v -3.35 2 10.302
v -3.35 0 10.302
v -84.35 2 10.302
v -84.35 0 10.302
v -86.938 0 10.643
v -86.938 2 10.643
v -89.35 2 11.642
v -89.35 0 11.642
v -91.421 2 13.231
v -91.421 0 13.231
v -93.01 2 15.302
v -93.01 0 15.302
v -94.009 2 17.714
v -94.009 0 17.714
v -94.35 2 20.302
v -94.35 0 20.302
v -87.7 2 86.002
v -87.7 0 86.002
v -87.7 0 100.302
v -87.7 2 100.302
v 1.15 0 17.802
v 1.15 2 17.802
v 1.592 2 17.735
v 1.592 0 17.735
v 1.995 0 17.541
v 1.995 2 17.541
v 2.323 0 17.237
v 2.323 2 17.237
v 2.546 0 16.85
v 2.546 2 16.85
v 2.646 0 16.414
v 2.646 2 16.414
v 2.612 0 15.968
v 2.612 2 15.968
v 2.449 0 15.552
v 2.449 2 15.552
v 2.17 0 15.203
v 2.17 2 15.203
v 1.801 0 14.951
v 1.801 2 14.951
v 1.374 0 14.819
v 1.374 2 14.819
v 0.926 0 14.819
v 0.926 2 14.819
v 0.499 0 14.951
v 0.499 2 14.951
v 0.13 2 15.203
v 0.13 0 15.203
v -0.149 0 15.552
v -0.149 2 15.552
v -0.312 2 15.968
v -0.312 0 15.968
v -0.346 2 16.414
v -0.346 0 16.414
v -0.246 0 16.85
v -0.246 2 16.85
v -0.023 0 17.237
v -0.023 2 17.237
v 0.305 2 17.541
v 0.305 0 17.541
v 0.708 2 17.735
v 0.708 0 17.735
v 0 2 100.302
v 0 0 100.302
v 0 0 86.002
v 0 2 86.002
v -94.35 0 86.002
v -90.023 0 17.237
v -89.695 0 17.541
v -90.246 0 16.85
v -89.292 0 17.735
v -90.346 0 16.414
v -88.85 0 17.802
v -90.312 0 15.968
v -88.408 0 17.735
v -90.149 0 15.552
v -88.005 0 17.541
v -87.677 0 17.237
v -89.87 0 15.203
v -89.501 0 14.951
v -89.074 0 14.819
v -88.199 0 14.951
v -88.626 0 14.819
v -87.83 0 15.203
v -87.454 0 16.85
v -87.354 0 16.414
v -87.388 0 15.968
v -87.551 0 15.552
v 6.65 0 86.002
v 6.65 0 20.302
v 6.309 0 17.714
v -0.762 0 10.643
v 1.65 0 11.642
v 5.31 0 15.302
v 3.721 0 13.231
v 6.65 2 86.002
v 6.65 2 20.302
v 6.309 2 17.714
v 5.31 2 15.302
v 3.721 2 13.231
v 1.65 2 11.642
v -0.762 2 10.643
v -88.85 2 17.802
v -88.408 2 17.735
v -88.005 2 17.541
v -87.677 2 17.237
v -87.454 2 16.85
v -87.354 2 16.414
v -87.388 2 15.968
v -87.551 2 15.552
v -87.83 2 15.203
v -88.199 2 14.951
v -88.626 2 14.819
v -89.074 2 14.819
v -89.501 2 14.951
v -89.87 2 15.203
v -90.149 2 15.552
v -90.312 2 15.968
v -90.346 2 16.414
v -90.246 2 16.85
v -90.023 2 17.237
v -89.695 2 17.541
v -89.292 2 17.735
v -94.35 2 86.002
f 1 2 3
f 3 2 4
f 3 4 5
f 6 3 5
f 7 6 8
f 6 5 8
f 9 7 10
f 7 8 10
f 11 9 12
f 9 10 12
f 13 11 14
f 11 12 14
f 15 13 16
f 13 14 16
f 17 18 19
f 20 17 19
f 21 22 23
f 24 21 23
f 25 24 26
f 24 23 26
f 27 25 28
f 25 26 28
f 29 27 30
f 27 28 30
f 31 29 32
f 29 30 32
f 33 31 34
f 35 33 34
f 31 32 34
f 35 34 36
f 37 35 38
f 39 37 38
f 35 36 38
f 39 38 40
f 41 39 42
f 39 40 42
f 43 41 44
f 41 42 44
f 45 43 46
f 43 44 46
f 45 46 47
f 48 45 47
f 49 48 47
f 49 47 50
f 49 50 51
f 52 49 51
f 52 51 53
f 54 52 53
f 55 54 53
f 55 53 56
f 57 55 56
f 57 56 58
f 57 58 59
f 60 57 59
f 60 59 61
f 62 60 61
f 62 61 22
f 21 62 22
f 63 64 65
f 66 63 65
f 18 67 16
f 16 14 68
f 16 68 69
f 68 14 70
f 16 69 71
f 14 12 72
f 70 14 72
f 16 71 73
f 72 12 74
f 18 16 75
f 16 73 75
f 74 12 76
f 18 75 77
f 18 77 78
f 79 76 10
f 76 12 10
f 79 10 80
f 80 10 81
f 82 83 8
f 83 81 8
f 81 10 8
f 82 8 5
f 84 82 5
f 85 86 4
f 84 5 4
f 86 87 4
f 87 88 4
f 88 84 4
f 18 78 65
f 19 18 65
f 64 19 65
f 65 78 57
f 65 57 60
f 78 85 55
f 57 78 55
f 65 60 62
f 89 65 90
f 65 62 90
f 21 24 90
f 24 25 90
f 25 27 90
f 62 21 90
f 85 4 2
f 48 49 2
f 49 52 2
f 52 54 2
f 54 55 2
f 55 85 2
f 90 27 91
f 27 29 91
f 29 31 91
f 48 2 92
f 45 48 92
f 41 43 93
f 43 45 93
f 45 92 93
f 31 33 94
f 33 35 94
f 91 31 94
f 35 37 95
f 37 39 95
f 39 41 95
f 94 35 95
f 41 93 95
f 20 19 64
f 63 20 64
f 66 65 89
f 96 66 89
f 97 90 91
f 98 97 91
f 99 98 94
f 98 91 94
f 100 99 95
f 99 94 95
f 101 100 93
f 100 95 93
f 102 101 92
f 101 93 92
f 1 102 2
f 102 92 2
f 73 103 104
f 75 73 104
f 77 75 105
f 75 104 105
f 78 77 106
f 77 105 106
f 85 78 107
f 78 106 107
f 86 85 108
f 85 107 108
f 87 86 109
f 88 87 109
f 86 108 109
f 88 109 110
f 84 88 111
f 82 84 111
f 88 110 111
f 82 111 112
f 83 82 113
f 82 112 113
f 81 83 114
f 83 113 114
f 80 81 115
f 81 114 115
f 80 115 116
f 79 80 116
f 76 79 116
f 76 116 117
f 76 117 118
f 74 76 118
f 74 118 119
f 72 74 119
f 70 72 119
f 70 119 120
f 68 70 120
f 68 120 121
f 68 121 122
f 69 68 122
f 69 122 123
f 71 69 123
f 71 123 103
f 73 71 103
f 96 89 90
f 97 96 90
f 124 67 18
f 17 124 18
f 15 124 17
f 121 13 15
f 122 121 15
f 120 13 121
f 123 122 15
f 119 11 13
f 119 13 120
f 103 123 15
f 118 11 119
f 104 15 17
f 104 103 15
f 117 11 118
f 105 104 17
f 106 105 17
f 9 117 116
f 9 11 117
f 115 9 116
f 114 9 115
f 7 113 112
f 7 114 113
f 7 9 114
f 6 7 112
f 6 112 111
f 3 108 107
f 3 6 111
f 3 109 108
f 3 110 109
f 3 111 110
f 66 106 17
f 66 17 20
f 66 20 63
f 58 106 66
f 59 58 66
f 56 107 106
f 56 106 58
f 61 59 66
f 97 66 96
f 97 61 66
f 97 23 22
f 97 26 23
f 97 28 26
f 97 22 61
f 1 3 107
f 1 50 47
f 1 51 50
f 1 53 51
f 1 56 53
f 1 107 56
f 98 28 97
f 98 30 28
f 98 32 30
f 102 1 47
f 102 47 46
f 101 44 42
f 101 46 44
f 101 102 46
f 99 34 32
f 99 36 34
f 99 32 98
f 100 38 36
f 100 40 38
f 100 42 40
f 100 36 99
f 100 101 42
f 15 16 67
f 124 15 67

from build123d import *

# Parameters (mm, degrees)
EXTRUDE_1_DEPTH     = 2
SKETCH_3_R          = 1.5
CUT_EXTRUDE_1_DEPTH = 10


with BuildPart() as part:
    # 草图1 → 凸台-拉伸1 (new body)
    with BuildSketch(Plane(origin=(0, 0, 0), x_dir=(1, 0, 0), z_dir=(0, 1, 0))):
        with BuildLine():
            Line((0, -100.302122976), (0, -86.002122976))
            Line((0, -86.002122976), (6.65, -86.002122976))
            Line((6.65, -86.002122976), (6.65, -20.302122976))
            ThreePointArc((6.65, -20.302122976), (3.721067812, -13.231055164), (-3.35, -10.302122976))
            Line((-3.35, -10.302122976), (-84.35, -10.302122976))
            ThreePointArc((-84.35, -10.302122976), (-91.421067812, -13.231055164), (-94.35, -20.302122976))
            Line((-94.35, -20.302122976), (-94.35, -86.002122976))
            Line((-94.35, -86.002122976), (-87.7, -86.002122976))
            Line((-87.7, -86.002122976), (-87.7, -100.302122976))
            Line((-87.7, -100.302122976), (0, -100.302122976))
        make_face()
    extrude(amount=EXTRUDE_1_DEPTH)

    # 草图3 → 切除-拉伸1 (cut)
    with BuildSketch(Plane(origin=(0, 2, 0), x_dir=(1, 0, 0), z_dir=(0, 1, 0))):
        with Locations(Location((-88.85, -16.302122976, 0), (0, 0, 270))):
            Circle(SKETCH_3_R)
        with Locations(Location((1.15, -16.302122976, 0), (0, 0, 270))):
            Circle(SKETCH_3_R)
    extrude(amount=-CUT_EXTRUDE_1_DEPTH, mode=Mode.SUBTRACT)


solid = part.part
